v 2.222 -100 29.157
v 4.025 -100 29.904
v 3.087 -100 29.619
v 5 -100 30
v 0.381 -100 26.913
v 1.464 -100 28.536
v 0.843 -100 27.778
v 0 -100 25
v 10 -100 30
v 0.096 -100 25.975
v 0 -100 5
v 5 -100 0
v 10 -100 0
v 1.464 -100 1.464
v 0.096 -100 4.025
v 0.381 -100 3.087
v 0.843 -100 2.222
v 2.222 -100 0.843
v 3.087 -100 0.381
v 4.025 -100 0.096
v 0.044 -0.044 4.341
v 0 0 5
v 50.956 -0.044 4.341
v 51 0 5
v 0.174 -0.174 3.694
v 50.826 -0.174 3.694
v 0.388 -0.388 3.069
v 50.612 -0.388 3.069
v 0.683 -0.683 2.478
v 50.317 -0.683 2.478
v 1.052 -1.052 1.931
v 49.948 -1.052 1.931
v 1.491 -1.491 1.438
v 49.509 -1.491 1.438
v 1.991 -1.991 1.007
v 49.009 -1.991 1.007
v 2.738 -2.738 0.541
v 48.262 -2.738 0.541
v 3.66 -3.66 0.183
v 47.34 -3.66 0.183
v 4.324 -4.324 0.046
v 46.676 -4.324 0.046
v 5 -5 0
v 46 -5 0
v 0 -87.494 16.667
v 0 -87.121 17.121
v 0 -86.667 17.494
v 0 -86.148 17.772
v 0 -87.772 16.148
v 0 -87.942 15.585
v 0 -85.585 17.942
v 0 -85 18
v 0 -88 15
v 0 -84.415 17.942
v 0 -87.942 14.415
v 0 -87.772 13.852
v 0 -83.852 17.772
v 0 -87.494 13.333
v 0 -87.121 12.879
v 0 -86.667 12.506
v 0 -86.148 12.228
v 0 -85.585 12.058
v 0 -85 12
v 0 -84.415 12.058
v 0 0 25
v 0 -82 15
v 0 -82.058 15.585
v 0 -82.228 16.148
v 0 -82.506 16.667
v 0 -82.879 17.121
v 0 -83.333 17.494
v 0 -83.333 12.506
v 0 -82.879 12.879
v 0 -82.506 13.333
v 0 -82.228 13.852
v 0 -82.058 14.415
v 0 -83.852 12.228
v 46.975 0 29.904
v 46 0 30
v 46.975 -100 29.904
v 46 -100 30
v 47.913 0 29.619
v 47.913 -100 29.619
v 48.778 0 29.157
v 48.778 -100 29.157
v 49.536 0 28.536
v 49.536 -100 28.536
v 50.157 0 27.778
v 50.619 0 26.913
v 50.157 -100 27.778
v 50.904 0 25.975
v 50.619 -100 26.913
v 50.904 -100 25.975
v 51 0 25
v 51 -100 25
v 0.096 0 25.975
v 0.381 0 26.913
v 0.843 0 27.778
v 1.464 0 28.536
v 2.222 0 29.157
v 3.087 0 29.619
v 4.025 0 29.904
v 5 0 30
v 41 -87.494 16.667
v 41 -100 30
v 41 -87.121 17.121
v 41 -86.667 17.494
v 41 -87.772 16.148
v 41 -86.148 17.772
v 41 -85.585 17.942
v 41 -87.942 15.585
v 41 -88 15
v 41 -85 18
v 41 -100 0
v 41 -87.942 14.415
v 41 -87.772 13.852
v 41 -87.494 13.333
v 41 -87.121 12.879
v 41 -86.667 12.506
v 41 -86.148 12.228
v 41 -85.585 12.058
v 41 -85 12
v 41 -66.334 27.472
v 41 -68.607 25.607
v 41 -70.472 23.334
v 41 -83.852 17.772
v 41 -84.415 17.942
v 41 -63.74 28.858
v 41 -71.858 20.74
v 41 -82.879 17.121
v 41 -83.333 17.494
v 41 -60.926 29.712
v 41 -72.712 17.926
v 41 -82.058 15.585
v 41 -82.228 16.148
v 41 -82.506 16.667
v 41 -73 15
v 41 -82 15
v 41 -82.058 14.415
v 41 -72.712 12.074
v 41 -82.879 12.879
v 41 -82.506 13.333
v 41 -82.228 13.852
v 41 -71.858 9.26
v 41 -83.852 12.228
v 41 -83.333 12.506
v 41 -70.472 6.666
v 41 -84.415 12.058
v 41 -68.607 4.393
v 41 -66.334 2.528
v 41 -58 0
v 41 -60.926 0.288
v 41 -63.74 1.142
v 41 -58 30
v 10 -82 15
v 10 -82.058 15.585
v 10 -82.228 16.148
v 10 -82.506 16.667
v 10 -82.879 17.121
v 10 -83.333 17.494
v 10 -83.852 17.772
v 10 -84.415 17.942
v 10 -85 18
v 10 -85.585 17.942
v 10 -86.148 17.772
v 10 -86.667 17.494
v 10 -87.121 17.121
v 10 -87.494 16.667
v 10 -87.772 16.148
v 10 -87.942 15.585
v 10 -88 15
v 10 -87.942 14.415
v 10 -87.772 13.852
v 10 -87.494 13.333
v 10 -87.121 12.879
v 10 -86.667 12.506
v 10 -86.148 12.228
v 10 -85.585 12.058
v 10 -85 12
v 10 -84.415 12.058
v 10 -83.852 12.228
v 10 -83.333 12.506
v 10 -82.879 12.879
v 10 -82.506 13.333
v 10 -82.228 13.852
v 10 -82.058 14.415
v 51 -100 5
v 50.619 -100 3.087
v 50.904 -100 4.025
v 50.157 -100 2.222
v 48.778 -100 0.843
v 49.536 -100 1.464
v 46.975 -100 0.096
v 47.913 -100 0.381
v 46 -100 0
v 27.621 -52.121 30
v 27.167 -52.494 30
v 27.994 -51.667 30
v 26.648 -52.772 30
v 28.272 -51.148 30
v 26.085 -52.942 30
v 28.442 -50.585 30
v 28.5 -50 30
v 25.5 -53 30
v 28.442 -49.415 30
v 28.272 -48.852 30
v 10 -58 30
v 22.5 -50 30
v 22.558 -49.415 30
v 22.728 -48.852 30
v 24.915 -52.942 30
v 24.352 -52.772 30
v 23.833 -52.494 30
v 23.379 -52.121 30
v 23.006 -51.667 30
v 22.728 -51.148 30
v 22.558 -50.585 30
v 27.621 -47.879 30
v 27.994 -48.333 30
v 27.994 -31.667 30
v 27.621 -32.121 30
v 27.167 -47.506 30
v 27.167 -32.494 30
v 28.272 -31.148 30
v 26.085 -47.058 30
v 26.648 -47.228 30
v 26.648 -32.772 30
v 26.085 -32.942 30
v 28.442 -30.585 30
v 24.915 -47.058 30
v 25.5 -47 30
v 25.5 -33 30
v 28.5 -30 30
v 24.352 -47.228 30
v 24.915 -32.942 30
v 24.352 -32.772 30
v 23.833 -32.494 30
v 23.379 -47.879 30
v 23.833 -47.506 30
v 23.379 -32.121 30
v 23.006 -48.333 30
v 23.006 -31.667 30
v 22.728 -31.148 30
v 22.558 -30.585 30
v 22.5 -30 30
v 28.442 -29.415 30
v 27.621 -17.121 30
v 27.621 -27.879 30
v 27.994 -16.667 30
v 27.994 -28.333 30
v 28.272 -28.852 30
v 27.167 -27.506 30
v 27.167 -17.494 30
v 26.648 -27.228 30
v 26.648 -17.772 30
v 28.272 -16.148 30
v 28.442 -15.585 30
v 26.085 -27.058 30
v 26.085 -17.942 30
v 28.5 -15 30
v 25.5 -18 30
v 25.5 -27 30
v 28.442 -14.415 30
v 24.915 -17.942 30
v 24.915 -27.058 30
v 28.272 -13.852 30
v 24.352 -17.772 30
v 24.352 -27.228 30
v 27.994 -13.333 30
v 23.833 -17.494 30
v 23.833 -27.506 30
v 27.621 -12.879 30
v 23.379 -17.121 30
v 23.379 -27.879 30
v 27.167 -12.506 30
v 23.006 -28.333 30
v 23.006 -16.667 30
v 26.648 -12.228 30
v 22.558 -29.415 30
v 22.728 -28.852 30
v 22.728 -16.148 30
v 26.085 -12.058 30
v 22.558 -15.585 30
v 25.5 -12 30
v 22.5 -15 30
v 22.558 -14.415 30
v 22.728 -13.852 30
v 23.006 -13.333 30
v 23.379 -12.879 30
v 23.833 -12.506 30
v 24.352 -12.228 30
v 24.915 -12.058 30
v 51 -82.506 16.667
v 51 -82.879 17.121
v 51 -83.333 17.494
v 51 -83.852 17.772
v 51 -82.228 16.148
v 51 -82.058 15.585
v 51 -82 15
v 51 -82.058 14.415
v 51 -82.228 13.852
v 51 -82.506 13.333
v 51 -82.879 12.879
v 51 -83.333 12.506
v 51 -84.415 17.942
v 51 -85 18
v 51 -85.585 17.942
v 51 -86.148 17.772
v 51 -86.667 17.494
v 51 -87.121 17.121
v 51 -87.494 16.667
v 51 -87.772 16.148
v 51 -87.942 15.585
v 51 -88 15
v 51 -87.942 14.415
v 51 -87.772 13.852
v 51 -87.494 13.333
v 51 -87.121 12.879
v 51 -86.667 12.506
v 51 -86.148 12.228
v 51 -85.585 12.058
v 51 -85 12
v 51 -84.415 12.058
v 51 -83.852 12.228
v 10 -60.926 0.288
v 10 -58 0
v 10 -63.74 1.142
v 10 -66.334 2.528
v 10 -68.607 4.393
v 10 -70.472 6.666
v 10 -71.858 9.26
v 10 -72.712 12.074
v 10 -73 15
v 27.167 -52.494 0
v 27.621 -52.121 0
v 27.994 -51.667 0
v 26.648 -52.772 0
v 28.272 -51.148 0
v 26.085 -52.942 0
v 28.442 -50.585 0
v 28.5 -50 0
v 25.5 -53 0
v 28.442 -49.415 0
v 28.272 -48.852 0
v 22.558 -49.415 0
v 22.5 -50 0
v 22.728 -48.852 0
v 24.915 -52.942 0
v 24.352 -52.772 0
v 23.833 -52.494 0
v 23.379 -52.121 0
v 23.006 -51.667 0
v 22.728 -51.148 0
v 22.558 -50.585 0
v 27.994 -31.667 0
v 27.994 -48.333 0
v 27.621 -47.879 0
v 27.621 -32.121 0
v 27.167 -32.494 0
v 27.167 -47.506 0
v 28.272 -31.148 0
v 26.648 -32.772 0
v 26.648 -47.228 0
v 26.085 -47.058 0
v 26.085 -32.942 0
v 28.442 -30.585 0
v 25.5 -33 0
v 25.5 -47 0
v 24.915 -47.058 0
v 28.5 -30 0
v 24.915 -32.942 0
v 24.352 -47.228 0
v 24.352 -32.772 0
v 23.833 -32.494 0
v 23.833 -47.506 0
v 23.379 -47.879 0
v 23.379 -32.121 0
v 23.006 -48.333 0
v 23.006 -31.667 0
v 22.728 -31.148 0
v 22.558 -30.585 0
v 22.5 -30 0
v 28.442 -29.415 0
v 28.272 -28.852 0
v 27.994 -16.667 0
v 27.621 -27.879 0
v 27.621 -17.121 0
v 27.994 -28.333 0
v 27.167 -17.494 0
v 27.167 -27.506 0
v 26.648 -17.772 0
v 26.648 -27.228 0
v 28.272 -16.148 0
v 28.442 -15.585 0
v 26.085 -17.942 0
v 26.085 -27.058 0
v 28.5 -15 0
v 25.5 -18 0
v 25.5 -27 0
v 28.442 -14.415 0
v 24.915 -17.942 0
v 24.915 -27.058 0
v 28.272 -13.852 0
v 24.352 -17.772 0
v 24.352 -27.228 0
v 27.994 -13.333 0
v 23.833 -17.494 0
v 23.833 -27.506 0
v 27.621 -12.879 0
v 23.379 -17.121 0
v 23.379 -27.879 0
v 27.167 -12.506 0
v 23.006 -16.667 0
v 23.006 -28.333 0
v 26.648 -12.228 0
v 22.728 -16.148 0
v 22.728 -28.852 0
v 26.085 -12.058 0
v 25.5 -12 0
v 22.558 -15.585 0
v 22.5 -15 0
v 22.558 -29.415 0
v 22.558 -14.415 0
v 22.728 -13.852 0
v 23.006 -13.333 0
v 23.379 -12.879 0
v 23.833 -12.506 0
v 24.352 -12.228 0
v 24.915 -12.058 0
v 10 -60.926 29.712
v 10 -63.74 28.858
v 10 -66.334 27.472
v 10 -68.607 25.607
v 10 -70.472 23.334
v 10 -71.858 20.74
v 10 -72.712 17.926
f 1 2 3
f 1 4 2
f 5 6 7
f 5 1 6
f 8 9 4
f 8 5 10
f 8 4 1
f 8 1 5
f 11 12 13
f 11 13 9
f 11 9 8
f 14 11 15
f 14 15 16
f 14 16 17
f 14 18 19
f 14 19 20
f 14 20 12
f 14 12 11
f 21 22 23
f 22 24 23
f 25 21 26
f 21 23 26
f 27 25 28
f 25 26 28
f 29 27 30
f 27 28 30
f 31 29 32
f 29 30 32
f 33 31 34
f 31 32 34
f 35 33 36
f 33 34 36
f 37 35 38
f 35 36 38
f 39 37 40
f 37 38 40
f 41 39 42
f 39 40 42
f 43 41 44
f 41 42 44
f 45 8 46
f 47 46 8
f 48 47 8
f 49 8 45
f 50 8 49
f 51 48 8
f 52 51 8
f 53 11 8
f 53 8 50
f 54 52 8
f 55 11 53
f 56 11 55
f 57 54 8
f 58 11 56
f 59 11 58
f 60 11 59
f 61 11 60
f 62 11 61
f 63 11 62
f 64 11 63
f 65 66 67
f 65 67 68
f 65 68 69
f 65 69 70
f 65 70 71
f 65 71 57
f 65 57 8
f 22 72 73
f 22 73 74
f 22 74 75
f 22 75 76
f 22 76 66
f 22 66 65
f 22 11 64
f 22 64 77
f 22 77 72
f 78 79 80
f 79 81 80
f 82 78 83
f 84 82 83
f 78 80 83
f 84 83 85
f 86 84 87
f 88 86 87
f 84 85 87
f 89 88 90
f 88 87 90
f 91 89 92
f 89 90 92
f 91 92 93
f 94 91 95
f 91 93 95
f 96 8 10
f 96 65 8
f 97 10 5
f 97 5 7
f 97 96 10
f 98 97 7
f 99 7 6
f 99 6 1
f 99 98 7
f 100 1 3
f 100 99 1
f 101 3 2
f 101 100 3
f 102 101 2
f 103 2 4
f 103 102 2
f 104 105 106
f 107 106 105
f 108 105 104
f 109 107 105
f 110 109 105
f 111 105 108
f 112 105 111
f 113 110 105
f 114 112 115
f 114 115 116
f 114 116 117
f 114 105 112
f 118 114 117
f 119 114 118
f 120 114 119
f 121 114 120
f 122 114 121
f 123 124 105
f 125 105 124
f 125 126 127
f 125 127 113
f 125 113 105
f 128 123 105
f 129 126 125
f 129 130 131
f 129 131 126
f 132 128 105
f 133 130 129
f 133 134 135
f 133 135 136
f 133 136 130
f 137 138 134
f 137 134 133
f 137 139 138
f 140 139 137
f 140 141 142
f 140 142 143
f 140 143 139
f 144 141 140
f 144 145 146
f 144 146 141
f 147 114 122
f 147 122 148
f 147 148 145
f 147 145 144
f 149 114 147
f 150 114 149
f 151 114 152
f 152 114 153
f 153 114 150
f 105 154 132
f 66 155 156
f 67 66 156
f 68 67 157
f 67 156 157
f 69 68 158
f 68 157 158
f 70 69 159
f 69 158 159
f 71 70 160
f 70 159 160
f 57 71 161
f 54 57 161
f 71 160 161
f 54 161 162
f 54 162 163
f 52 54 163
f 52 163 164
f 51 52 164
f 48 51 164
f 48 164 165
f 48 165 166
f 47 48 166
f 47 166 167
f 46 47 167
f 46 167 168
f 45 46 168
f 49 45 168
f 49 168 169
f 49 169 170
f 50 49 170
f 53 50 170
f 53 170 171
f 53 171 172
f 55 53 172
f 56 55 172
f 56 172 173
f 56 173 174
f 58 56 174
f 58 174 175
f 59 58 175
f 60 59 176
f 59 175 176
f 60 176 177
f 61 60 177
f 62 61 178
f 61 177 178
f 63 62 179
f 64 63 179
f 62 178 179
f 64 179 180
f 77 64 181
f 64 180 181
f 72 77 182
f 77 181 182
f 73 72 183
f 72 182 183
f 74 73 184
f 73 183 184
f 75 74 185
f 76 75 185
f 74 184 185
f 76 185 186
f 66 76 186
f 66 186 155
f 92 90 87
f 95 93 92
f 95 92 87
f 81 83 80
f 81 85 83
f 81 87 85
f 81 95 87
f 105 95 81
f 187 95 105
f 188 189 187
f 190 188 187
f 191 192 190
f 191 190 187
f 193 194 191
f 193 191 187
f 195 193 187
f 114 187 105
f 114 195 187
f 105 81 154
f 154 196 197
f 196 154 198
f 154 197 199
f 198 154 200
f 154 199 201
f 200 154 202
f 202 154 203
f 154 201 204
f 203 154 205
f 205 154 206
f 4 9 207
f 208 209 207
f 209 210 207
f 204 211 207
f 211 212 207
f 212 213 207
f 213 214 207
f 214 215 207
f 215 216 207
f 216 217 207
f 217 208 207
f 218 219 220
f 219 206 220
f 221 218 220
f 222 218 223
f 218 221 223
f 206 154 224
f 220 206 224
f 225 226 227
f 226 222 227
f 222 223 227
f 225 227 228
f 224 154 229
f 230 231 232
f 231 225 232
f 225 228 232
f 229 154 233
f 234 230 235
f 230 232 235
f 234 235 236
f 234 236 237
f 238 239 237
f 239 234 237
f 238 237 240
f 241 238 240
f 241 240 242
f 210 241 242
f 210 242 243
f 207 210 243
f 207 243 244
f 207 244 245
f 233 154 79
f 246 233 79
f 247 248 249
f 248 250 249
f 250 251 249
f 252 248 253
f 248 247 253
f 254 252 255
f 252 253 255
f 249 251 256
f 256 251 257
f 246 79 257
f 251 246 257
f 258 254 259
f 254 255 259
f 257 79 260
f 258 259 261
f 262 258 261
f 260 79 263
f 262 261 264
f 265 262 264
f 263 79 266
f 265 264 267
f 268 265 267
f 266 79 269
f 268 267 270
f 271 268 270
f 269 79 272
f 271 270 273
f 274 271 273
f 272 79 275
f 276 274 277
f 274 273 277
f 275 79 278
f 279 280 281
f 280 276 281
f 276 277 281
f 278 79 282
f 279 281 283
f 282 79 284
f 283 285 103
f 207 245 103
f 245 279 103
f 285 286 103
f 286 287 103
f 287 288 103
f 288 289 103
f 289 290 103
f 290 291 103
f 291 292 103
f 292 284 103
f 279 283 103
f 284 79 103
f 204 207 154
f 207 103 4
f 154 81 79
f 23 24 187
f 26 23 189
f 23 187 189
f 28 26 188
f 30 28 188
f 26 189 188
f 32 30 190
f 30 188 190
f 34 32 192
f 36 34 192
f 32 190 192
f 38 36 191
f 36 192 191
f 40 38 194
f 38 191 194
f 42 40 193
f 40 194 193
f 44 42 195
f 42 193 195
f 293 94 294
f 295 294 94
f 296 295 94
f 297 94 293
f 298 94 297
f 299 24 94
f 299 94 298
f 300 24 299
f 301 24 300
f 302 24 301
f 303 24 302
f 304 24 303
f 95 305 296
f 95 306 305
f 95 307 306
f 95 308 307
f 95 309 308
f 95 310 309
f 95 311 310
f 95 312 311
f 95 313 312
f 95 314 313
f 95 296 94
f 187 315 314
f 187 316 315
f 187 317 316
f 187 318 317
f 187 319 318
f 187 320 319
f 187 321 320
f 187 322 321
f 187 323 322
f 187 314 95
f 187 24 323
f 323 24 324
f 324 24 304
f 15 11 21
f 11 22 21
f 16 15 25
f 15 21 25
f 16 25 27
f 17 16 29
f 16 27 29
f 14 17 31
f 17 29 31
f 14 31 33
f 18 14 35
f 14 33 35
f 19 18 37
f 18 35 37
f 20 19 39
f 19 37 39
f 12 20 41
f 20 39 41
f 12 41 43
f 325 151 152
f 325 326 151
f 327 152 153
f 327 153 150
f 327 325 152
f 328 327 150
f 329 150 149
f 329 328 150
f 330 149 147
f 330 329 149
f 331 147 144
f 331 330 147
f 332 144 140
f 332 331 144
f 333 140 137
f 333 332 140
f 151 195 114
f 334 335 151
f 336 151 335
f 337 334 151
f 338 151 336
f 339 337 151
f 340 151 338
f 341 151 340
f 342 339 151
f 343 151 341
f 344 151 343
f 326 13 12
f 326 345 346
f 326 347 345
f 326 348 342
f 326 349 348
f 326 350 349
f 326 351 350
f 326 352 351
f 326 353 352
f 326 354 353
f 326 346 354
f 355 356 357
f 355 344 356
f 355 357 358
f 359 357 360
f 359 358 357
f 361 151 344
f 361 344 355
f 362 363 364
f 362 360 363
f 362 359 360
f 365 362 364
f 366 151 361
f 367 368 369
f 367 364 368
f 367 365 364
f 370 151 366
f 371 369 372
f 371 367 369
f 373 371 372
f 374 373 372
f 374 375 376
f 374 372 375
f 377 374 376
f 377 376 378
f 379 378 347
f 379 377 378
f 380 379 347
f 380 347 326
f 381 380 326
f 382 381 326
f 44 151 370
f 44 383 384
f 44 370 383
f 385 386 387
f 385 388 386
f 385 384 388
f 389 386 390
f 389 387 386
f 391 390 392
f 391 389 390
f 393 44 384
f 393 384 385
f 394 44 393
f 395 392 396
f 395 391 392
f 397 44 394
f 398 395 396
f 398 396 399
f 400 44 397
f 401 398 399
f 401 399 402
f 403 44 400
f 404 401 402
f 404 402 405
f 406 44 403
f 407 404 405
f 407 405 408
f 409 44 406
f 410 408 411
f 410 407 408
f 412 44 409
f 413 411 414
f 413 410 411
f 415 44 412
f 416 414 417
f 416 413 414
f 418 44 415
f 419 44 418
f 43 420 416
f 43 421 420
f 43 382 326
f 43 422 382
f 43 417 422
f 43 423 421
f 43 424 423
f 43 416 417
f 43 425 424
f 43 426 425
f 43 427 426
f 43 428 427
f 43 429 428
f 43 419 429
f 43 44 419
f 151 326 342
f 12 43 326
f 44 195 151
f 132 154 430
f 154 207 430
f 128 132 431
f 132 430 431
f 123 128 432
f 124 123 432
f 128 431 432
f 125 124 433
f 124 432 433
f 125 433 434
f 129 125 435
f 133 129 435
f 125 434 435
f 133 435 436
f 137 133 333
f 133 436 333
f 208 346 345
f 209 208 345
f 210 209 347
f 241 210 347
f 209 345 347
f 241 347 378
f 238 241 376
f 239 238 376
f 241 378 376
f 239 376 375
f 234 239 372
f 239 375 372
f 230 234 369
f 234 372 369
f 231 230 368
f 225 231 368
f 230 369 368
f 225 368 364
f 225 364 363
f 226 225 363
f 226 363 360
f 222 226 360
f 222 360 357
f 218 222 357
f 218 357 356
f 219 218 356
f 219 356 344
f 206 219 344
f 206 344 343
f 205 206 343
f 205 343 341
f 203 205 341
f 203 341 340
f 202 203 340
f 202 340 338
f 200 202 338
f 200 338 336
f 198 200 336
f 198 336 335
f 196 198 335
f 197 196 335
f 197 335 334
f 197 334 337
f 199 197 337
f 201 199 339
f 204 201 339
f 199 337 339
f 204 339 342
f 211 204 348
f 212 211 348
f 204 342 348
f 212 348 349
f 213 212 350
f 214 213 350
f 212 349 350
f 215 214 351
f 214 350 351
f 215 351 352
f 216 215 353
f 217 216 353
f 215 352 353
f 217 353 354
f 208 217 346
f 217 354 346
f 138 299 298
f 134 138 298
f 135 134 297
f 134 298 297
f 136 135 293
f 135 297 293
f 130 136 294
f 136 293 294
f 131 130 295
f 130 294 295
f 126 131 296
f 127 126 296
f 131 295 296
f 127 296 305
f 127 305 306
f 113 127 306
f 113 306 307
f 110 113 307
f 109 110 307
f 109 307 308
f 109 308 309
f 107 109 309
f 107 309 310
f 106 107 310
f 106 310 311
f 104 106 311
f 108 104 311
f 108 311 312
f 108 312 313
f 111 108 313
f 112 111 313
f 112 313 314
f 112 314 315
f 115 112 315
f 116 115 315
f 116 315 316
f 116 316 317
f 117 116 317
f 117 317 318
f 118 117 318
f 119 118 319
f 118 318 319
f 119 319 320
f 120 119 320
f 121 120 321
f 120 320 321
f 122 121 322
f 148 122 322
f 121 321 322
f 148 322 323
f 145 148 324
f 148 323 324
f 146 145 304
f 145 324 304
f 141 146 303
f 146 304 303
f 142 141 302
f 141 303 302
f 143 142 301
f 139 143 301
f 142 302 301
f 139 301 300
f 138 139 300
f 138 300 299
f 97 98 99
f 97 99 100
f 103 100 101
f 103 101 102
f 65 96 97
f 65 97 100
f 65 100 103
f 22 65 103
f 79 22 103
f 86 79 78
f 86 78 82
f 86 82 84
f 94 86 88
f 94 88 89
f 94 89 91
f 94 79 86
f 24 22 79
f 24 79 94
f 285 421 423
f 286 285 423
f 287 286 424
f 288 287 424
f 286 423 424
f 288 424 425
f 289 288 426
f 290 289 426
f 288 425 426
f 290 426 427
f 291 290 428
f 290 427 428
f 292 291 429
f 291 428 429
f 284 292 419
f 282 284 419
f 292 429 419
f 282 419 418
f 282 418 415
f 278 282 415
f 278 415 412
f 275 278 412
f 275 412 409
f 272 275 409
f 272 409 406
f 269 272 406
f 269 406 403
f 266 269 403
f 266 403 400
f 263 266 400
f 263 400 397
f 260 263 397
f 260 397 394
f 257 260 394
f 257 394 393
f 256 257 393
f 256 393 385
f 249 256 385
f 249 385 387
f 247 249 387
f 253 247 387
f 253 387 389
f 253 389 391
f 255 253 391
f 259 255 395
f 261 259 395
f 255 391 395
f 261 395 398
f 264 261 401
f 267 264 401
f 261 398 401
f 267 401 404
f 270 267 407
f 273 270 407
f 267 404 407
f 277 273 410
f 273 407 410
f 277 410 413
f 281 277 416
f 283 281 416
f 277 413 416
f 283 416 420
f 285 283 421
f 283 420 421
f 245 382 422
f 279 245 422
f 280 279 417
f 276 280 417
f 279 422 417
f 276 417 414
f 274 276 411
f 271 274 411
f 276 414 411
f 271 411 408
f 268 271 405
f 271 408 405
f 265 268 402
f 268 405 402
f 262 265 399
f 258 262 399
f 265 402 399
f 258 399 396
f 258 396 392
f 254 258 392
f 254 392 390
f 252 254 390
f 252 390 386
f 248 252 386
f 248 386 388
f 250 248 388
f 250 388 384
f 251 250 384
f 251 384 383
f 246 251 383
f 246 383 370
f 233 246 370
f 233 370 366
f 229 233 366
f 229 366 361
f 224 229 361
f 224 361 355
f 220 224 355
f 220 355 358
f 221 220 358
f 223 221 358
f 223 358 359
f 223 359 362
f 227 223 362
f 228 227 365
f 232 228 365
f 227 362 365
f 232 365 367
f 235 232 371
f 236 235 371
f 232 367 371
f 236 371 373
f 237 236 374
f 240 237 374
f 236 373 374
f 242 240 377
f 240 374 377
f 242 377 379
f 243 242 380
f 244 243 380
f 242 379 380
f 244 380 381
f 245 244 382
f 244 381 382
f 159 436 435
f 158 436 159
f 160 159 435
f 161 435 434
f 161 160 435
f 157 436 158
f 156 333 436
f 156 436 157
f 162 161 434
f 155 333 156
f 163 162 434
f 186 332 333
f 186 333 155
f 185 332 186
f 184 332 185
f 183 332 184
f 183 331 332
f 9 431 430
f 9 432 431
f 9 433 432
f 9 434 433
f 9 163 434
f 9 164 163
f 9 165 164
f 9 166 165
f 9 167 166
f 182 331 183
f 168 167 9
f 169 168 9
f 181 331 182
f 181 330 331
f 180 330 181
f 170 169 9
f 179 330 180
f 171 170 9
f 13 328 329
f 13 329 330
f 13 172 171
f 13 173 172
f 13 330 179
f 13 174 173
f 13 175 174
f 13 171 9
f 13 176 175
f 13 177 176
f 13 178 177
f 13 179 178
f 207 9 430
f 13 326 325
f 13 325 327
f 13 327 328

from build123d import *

# Parameters (mm, degrees)
BOSS_EXTRUDE1_DEPTH = 30
SKETCH2_R           = 3
CUT_EXTRUDE1_DEPTH  = 111
SKETCH3_R           = 3
CUT_EXTRUDE2_DEPTH  = 111
FILLET1_R           = 5
FILLET2_R           = 5
FILLET3_R           = 15


with BuildPart() as part:
    # Sketch1 → Boss-Extrude1 (new body)
    with BuildSketch(Plane.XY):
        Polygon((0, 0), (51, 0), (51, -100), (41, -100), (41, -73), (10, -73), (10, -100), (0, -100), align=None)
    extrude(amount=BOSS_EXTRUDE1_DEPTH)

    # Sketch2 → Cut-Extrude1 (cut)
    with BuildSketch(Plane(origin=(51, 0, 0), x_dir=(0, 0, -1), z_dir=(1, 0, 0))):
        with Locations(Location((-15, -85, 0), (0, 0, 90))):
            Circle(SKETCH2_R)
    extrude(amount=-CUT_EXTRUDE1_DEPTH, mode=Mode.SUBTRACT)

    # Sketch3 → Cut-Extrude2 (cut)
    with BuildSketch(Plane(origin=(0, 0, 0), x_dir=(-1, 0, 0), z_dir=(0, 0, -1))):
        with Locations((-25.5, -15)):
            Circle(SKETCH3_R)
        with Locations((-25.5, -30)):
            Circle(SKETCH3_R)
        with Locations((-25.5, -50)):
            Circle(SKETCH3_R)
    extrude(amount=-CUT_EXTRUDE2_DEPTH, mode=Mode.SUBTRACT)

    # Fillet1
    fillet1_edges = [part.edges().sort_by_distance(p)[0] for p in [
        (0, -50, 0),
        (25.5, 0, 0),
        (51, -50, 0),
    ]]
    fillet(fillet1_edges, radius=FILLET1_R)

    # Fillet2
    fillet2_edges = [part.edges().sort_by_distance(p)[0] for p in [
        (51, -50, 30),
        (0, -50, 30),
    ]]
    fillet(fillet2_edges, radius=FILLET2_R)

    # Fillet3
    fillet3_edges = [part.edges().sort_by_distance(p)[0] for p in [
        (25.5, -73, 30),
        (25.5, -73, 0),
    ]]
    fillet(fillet3_edges, radius=FILLET3_R - 0.0001)  # a hair under: the kernel refuses the full size


solid = part.part
